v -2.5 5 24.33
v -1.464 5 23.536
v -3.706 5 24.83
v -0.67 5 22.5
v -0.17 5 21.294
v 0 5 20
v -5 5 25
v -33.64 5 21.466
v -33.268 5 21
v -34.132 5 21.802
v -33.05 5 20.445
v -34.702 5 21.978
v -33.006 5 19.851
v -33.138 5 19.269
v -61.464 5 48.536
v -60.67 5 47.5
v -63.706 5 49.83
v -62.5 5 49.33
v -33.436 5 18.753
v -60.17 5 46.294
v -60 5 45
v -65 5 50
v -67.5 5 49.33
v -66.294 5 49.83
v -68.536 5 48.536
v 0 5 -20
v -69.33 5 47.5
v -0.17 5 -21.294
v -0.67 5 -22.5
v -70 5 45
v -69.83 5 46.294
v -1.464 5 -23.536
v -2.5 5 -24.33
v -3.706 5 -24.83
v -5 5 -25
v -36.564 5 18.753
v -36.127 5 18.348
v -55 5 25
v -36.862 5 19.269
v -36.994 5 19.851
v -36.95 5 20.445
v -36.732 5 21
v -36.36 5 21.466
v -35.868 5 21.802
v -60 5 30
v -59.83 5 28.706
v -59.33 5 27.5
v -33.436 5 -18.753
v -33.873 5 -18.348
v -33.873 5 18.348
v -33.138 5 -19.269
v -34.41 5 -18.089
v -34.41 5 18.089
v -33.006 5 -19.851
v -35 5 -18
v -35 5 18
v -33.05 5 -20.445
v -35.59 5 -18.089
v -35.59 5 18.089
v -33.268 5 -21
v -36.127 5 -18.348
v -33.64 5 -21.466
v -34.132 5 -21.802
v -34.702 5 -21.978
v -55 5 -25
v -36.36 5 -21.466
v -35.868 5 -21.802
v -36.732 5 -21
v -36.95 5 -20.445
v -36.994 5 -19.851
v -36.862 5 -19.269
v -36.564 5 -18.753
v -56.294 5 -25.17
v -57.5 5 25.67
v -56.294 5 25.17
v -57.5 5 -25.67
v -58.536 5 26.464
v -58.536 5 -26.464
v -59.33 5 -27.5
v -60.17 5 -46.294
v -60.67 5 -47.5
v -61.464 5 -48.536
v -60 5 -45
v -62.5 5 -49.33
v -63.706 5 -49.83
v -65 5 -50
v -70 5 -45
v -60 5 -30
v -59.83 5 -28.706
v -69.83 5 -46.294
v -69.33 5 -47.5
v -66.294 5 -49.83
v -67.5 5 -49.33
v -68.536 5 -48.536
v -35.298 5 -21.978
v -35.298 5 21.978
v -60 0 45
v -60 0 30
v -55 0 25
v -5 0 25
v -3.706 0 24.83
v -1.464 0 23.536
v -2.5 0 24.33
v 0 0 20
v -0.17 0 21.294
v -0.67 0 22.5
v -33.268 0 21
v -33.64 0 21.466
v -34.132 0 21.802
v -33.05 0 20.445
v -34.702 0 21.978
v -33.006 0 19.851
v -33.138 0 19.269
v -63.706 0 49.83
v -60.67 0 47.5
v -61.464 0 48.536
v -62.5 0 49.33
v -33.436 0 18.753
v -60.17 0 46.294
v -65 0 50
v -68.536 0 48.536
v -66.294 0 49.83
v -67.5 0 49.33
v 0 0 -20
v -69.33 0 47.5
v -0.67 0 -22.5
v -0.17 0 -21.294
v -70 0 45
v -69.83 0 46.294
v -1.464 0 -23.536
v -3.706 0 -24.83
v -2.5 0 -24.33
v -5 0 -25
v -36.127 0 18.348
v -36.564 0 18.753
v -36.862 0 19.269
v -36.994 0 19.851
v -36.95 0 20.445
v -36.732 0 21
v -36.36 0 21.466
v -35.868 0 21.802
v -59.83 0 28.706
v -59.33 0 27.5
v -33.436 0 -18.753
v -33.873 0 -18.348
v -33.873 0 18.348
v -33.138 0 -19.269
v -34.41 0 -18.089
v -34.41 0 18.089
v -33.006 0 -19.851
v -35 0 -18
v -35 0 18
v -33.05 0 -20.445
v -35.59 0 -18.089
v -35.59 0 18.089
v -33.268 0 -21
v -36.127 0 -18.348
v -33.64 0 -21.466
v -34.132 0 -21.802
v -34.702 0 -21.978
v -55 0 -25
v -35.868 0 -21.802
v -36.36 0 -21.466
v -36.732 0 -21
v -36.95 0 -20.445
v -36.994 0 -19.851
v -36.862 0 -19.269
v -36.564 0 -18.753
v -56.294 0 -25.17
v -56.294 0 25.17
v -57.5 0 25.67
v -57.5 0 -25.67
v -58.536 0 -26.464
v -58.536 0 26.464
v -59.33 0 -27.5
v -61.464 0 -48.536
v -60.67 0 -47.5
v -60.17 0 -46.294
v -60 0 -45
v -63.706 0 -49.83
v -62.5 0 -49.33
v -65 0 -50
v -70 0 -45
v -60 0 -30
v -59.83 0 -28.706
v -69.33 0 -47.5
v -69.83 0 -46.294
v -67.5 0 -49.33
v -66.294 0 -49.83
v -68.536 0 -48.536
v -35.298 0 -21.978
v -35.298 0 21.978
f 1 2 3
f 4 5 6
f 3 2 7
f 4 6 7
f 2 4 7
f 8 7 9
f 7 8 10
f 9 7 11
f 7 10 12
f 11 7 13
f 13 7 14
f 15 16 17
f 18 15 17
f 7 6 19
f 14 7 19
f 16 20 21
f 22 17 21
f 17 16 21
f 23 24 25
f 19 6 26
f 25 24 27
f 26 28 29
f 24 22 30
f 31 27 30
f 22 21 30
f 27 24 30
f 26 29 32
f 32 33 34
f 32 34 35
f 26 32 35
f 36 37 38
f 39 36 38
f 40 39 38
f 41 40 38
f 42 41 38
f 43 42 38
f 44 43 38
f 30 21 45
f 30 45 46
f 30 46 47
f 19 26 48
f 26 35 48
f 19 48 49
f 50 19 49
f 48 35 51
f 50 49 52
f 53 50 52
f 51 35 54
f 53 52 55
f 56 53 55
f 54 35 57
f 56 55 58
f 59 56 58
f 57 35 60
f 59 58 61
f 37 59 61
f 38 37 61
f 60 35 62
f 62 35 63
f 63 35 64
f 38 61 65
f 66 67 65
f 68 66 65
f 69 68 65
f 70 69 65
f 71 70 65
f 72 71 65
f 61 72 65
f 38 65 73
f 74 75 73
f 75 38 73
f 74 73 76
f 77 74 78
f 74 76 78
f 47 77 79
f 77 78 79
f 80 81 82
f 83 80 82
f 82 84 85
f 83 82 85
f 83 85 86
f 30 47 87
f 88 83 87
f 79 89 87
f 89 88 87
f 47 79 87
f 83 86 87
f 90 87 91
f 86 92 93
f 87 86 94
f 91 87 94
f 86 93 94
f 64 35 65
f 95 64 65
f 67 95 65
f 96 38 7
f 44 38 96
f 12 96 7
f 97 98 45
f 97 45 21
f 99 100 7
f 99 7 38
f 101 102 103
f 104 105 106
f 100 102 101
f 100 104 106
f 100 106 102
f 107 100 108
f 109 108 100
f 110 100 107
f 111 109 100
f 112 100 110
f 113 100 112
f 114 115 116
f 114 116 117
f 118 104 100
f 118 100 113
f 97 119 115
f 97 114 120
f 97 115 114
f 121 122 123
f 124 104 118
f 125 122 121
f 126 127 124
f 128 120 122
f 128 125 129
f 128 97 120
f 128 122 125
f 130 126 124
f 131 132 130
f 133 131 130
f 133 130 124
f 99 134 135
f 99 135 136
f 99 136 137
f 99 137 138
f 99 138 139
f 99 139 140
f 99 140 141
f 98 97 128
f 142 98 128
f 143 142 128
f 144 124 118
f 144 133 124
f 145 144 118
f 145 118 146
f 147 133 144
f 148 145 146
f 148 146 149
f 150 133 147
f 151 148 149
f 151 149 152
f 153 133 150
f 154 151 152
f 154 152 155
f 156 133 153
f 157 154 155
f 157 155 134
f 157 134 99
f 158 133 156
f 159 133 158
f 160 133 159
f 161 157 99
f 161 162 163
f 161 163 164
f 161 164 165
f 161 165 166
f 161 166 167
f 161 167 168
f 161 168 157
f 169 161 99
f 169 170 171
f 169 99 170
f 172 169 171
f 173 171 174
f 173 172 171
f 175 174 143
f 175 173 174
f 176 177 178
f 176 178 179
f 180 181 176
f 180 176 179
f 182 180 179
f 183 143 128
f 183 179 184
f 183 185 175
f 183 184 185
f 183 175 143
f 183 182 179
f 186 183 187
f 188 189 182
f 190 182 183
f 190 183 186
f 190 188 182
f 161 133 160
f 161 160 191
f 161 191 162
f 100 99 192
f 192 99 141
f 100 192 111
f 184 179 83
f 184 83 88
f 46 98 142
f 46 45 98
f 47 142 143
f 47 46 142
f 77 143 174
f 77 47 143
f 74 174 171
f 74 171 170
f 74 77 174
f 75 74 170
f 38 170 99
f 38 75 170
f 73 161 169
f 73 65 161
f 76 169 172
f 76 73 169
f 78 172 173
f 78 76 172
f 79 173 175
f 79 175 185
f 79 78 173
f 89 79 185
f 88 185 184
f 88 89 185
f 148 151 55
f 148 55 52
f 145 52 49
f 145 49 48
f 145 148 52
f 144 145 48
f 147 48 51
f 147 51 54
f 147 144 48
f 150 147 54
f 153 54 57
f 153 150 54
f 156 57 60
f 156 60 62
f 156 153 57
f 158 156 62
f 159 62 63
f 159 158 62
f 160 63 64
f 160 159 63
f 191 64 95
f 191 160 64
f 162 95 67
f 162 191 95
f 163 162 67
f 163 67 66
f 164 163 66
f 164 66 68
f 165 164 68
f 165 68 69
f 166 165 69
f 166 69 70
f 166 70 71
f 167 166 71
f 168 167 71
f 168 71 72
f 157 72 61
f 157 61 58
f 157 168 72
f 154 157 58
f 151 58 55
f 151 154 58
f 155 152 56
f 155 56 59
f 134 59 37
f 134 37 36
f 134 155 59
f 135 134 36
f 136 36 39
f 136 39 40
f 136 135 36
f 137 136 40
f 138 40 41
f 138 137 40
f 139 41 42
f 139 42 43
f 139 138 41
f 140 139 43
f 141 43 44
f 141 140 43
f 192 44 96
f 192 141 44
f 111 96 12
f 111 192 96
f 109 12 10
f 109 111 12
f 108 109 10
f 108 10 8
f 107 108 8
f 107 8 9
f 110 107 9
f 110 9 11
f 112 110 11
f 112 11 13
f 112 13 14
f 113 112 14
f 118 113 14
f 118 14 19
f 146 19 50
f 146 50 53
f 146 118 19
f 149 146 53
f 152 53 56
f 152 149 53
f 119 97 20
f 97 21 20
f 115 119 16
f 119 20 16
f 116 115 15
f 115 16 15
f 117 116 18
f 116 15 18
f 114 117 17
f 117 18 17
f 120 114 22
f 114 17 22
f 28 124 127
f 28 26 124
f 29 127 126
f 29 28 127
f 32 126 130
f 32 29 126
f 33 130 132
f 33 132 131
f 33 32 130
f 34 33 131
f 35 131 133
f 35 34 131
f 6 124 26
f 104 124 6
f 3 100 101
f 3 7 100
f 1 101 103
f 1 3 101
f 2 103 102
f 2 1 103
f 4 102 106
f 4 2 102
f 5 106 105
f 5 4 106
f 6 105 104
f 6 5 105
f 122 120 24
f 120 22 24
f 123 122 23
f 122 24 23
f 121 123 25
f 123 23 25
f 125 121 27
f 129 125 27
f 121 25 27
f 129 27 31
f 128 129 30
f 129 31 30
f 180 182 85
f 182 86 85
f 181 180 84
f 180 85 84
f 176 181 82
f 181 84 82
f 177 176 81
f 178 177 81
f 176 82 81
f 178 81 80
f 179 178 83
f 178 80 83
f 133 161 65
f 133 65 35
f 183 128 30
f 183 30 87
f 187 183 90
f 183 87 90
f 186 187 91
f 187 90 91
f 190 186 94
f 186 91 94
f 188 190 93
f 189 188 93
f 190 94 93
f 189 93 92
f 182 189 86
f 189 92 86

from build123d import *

# Parameters (mm, degrees)
SKETCH_2_R      = 2
EXTRUDE_1_DEPTH = 5
FILLET_1_R      = 5


with BuildPart() as part:
    # 스케치2 → 보스-돌출1 (new body)
    with BuildSketch(Plane(origin=(0, 0, 0), x_dir=(1, 0, 0), z_dir=(0, 1, 0))):
        Polygon((-60, -25), (-60, -50), (-70, -50), (-70, 50), (-60, 50), (-60, 25), (0, 25), (0, -25), align=None)
        with Locations(Location((-35, 20, 0), (0, 0, 270))):
            Circle(SKETCH_2_R, mode=Mode.SUBTRACT)
        with Locations(Location((-35, -20, 0), (0, 0, 90))):
            Circle(SKETCH_2_R, mode=Mode.SUBTRACT)
    extrude(amount=EXTRUDE_1_DEPTH)

    # 필렛1
    fillet_1_edges = [part.edges().sort_by_distance(p)[0] for p in [
        (-60, 2.5, -25),
        (0, 2.5, -25),
        (0, 2.5, 25),
        (-60, 2.5, 25),
        (-60, 2.5, 50),
        (-70, 2.5, 50),
        (-60, 2.5, -50),
        (-70, 2.5, -50),
    ]]
    fillet(fillet_1_edges, radius=FILLET_1_R - 0.0001)  # a hair under: the kernel refuses the full size


solid = part.part
